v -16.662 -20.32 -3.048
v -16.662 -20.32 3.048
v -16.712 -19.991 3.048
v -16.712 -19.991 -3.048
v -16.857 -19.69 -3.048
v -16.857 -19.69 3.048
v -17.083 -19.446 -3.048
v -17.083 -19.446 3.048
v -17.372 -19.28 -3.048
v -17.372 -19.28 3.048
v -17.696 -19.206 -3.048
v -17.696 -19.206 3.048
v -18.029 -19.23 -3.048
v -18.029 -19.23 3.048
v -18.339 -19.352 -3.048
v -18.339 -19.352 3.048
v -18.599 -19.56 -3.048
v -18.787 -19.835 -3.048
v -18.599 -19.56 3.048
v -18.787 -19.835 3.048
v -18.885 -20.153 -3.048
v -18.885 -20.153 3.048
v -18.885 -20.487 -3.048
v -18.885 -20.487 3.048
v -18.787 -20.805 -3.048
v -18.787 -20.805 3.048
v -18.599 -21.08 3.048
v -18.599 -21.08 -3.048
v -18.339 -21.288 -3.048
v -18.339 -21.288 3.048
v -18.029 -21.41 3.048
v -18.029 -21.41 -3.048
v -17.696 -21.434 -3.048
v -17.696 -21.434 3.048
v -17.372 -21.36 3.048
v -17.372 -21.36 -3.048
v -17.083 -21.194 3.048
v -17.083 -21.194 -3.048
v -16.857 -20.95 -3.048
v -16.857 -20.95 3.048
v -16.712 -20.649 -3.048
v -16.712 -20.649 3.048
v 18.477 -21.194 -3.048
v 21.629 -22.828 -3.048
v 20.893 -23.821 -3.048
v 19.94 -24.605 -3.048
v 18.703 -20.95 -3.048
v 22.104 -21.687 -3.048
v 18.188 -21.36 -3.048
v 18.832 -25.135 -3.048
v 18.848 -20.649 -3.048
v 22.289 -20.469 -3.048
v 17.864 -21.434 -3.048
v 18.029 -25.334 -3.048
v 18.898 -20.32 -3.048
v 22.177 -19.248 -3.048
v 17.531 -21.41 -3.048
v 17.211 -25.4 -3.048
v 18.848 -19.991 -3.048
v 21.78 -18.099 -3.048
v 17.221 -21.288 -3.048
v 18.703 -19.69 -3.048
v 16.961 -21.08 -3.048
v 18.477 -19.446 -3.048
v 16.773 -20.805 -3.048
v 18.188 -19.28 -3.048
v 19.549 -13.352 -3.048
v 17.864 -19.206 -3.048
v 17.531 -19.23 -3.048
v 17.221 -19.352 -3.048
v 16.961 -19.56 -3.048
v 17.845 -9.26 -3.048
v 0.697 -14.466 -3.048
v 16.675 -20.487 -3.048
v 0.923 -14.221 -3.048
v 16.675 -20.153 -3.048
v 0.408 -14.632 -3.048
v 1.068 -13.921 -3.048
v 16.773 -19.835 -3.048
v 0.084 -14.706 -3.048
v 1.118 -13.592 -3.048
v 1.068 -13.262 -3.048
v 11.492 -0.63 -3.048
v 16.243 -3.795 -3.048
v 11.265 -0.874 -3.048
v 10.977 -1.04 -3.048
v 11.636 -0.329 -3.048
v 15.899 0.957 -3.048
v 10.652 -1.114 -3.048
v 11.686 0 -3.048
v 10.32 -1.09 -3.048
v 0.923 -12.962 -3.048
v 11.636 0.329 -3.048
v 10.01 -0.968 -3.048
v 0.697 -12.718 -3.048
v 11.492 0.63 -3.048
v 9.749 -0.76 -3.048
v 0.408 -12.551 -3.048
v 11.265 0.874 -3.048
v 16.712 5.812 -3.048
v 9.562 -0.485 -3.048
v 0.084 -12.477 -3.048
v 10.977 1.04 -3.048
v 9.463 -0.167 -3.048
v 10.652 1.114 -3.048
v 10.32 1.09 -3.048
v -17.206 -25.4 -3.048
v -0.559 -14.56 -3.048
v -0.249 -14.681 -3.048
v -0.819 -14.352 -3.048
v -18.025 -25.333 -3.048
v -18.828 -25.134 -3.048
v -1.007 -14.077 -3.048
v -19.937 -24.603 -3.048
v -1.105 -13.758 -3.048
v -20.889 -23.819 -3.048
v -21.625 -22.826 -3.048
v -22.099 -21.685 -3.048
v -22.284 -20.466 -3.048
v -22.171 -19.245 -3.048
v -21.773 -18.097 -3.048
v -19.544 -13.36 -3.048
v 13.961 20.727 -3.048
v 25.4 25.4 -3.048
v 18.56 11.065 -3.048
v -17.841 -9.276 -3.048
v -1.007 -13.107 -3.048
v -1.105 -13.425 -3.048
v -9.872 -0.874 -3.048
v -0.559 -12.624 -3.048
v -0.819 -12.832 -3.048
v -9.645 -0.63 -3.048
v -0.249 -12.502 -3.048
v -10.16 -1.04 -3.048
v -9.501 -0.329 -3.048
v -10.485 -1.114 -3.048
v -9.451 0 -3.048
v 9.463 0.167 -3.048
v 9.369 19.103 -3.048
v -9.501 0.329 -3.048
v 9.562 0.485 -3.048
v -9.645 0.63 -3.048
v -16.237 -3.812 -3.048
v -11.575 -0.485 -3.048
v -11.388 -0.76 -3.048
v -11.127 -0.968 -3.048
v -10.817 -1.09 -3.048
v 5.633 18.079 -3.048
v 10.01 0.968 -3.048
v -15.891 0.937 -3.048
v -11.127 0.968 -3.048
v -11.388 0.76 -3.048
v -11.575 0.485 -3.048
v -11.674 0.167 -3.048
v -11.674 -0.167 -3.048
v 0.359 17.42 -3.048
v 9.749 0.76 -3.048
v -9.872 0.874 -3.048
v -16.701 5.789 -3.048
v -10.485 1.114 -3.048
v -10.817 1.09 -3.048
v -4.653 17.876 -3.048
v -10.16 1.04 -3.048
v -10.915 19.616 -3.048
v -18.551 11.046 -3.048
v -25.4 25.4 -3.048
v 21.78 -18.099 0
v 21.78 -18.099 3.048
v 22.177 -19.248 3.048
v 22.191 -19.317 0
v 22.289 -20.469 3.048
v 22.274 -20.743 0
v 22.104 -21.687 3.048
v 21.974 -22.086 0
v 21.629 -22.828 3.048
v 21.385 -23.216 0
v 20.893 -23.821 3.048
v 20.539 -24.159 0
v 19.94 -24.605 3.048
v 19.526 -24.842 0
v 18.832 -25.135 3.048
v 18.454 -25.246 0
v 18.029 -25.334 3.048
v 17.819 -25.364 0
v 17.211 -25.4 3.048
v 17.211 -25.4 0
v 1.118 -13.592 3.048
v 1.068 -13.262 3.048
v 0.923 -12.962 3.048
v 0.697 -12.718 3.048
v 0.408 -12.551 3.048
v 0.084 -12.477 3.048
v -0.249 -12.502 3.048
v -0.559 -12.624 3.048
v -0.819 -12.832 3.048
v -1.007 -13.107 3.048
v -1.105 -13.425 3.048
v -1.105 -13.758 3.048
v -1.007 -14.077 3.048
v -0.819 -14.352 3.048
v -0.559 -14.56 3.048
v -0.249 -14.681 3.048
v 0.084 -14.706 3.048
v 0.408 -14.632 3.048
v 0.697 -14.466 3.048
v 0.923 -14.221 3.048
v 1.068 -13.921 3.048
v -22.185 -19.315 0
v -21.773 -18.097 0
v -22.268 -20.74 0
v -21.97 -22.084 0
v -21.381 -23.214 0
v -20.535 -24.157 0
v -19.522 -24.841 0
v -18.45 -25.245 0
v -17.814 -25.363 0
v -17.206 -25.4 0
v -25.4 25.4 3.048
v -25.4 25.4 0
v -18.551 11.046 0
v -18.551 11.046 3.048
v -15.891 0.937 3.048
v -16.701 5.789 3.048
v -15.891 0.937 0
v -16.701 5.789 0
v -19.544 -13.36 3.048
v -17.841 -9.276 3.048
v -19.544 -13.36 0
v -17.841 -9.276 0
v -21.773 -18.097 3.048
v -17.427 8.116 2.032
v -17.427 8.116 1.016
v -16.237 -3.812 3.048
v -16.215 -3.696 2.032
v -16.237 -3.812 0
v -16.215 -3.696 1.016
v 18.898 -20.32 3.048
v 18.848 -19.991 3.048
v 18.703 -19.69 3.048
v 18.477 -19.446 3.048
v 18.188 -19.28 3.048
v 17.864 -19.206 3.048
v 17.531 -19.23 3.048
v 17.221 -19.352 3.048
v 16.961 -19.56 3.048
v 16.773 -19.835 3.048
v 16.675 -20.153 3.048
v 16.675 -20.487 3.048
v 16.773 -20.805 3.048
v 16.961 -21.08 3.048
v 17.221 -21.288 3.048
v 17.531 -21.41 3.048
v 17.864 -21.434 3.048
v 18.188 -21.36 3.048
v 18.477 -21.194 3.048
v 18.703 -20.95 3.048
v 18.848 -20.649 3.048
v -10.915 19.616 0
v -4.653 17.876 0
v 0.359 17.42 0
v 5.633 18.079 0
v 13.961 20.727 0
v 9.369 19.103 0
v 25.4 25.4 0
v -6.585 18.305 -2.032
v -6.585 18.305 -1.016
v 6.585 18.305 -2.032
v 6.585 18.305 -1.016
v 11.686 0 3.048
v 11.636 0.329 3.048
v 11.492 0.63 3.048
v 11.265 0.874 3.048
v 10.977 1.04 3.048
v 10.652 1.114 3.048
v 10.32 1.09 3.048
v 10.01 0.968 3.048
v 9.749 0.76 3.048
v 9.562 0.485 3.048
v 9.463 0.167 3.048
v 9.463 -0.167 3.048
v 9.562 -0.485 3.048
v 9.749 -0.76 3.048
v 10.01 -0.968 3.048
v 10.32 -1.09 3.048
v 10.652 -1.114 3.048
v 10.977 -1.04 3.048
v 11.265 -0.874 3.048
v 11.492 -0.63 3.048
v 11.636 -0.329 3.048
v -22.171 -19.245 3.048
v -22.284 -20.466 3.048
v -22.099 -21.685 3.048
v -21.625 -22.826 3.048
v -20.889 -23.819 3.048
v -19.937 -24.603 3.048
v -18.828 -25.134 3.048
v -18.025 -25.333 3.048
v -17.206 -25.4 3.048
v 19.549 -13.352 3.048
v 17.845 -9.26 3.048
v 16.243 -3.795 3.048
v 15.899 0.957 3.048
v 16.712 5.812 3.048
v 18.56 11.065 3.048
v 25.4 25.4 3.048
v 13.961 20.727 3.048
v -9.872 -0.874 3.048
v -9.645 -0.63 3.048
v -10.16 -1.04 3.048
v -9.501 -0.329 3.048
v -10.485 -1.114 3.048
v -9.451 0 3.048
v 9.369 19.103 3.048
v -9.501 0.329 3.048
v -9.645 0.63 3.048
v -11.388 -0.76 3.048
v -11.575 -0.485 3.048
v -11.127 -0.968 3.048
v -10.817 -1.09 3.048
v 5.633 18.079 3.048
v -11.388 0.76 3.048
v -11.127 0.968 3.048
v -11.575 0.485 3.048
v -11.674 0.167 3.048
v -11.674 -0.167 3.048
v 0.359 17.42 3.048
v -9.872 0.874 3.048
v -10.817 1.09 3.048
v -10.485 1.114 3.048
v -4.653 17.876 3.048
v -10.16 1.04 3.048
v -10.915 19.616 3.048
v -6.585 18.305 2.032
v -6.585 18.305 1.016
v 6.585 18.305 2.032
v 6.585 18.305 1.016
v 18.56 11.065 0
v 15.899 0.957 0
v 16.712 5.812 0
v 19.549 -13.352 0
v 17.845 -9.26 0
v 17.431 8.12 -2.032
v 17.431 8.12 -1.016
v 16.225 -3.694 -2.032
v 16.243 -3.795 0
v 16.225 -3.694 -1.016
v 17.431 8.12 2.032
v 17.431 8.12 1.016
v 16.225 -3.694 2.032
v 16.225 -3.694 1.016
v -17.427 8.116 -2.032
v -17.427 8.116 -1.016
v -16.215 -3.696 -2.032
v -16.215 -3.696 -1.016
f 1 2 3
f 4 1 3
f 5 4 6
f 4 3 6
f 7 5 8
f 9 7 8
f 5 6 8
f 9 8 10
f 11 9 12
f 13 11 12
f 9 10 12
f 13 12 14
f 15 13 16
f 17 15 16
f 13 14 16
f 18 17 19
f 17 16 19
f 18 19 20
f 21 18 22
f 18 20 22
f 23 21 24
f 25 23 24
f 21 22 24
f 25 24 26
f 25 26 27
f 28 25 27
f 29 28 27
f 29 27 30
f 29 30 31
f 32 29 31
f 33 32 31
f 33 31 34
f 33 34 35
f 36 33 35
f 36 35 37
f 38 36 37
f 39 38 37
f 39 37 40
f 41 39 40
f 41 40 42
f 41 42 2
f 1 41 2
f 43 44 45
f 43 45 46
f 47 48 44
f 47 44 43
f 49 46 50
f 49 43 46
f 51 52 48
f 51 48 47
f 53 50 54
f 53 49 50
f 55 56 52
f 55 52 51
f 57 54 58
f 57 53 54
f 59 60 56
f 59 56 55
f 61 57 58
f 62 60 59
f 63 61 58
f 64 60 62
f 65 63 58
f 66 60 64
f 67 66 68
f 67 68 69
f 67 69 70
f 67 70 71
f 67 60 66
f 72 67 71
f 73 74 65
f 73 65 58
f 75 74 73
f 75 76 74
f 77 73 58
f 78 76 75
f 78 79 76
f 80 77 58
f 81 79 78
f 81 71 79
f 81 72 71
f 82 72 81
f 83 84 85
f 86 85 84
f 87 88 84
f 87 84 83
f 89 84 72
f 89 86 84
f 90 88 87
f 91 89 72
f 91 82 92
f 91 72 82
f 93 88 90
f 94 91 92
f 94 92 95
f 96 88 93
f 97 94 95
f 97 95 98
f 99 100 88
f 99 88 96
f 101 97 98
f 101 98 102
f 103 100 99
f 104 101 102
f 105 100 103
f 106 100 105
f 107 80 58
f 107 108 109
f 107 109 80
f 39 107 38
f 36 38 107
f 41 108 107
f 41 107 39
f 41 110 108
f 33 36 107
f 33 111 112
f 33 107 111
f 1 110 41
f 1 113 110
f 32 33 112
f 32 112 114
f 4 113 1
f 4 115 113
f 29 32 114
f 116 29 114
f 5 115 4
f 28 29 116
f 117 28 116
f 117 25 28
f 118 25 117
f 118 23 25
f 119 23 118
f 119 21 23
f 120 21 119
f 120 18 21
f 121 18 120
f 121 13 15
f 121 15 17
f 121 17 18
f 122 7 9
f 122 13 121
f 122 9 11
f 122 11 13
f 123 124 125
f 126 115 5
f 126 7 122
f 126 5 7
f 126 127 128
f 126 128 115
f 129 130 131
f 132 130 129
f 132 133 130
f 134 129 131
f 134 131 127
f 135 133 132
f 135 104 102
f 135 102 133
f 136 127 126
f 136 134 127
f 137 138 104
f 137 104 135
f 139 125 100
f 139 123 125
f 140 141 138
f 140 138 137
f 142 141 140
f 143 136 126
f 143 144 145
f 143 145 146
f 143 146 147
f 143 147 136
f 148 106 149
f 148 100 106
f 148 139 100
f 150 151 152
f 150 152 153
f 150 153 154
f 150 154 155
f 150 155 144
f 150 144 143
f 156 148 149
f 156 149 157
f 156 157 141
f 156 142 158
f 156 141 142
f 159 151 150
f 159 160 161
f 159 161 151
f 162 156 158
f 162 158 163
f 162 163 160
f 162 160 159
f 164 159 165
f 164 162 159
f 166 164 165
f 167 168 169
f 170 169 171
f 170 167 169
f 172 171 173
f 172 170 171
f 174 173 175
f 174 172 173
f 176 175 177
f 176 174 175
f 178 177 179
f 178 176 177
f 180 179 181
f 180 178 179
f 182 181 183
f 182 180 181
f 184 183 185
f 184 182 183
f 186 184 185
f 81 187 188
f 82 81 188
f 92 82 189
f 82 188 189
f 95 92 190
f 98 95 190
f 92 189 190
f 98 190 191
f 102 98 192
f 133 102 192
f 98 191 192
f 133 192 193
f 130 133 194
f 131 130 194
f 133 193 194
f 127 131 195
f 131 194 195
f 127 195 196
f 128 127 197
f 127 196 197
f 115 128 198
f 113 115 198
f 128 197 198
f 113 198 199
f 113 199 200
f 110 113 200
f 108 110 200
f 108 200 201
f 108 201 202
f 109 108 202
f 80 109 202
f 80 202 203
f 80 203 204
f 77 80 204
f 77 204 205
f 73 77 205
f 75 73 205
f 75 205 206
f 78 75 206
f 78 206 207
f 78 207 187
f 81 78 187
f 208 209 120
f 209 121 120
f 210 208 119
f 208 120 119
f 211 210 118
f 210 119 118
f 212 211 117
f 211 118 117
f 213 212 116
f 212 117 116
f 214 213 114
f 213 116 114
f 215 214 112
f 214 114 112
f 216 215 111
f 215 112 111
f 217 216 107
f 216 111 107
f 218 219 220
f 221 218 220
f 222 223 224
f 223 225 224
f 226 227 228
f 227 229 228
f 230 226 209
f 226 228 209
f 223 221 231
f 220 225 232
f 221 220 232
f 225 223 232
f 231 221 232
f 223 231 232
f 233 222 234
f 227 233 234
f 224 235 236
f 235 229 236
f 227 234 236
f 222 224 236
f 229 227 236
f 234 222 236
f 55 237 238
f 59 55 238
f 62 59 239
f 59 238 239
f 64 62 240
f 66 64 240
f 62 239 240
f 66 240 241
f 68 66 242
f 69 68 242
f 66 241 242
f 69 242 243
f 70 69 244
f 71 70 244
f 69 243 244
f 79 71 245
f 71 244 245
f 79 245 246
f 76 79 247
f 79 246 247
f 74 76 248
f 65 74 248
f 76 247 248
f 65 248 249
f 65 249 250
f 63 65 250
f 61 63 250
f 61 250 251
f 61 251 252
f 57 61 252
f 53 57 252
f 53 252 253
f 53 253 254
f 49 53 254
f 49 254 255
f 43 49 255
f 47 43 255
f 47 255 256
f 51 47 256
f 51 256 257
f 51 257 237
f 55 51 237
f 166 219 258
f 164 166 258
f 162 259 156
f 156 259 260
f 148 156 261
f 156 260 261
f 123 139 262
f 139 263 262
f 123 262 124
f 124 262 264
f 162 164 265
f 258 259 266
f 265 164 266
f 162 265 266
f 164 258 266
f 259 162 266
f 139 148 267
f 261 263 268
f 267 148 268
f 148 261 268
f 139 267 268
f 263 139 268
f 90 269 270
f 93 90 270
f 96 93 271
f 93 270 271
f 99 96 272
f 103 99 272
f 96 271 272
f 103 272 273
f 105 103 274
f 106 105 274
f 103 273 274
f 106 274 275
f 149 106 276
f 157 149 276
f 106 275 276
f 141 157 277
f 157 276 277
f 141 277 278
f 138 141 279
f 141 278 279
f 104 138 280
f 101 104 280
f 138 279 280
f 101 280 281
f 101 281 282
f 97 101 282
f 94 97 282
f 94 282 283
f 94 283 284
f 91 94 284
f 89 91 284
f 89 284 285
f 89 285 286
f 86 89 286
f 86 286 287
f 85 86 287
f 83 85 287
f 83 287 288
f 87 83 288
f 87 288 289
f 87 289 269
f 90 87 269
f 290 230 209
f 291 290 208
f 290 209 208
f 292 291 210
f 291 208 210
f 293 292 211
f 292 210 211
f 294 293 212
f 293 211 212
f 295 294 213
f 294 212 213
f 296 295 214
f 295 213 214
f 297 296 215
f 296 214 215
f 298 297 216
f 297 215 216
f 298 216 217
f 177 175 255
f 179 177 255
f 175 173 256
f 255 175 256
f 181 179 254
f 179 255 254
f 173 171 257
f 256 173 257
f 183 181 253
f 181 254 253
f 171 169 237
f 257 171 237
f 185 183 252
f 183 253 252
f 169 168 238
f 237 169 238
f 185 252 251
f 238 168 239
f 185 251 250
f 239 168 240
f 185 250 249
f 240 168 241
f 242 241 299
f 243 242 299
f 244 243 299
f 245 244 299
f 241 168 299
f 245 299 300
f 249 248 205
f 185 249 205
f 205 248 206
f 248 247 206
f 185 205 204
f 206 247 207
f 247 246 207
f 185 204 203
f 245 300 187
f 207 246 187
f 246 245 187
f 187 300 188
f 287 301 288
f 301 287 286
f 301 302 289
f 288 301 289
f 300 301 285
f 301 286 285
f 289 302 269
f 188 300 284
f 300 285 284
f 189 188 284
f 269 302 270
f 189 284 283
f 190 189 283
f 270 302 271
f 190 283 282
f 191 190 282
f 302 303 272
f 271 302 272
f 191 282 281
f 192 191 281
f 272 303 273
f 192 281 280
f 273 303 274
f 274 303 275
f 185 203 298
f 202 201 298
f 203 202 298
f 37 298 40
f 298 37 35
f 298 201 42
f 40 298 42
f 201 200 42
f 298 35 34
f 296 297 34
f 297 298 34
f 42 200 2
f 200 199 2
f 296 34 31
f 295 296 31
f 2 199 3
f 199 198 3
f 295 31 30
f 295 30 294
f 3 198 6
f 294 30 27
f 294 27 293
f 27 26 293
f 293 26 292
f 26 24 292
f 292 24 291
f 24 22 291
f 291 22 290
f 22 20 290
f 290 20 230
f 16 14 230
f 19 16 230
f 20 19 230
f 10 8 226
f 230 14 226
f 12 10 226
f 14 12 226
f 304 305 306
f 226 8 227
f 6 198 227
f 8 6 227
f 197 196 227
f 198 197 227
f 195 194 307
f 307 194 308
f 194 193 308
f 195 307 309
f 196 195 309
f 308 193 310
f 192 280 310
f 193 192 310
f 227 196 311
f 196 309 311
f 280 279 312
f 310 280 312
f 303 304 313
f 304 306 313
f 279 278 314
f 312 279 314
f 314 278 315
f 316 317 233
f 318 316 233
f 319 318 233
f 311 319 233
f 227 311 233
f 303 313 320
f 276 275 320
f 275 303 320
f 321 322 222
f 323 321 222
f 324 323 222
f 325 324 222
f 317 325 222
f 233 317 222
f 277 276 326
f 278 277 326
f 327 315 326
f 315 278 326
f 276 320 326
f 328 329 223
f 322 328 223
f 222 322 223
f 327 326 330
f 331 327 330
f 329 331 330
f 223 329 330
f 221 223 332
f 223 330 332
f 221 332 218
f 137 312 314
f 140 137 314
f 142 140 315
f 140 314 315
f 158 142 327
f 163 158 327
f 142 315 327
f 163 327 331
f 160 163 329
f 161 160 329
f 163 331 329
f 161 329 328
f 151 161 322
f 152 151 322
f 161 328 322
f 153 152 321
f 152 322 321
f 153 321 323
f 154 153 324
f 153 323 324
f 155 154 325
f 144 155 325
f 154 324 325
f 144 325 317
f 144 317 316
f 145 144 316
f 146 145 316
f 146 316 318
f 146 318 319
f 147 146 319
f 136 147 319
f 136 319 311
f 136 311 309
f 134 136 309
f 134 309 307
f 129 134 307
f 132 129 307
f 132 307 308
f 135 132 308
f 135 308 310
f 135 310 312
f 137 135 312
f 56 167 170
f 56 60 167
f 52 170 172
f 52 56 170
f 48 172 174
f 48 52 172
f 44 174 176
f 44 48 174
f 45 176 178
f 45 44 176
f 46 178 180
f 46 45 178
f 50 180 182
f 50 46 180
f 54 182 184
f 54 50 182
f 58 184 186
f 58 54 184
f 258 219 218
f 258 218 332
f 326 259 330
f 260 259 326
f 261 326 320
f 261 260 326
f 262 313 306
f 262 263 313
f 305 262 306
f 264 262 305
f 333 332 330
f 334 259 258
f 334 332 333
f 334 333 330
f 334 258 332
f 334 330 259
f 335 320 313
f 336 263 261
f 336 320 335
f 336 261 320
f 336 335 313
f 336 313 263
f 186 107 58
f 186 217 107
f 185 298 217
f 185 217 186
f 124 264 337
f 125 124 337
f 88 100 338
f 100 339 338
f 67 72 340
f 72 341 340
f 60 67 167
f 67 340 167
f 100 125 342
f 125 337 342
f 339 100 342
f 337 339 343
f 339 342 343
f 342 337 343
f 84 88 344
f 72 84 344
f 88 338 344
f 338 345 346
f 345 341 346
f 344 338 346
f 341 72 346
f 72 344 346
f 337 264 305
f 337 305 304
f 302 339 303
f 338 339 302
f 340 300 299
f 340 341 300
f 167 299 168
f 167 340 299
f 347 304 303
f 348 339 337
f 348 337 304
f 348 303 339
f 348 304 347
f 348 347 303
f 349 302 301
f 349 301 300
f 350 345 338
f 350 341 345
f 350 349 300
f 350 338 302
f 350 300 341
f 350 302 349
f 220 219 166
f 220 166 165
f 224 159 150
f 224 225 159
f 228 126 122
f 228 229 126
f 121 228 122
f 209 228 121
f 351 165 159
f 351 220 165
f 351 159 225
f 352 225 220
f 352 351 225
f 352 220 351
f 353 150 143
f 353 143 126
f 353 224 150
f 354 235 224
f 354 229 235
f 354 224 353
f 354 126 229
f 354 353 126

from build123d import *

# Parameters (mm, degrees)
F1_DEPTH = 3.048
F2_R     = 1.1176
F3_DEPTH = 6.35
F4_R     = 5.08


with BuildPart() as f1:
    # F0 (on Top) → F1 (new body, symmetric)
    with BuildSketch(Plane.XY):
        with BuildLine():
            add(Edge.make_bspline(
                [(-25.4, 25.4), (0, 14.75683), (0, 14.75683), (25.4, 25.4)],
                knots=[0, 0, 0, 0, 50.8, 50.8, 50.8, 50.8], degree=3))
            add(Edge.make_bspline(
                [(-25.4, 25.4), (-12.7, -0.009303), (-12.678587, 0), (-25.4, -25.4)],
                knots=[0, 0, 0, 0, 50.8, 50.8, 50.8, 50.8], degree=3))
            Line((-25.4, -25.4), (25.4, -25.4))
            add(Edge.make_bspline(
                [(25.4, 25.4), (12.7, 0), (12.7, 0), (25.4, -25.4)],
                knots=[0, 0, 0, 0, 50.8, 50.8, 50.8, 50.8], degree=3))
        make_face()
    extrude(amount=F1_DEPTH, both=True)

    # F2 (on face) → F3 (cut)
    with BuildSketch(Plane.XY.offset(3.048)):
        with Locations((-17.78, -20.32)):
            Circle(F2_R)
        with Locations((17.78, -20.32)):
            Circle(F2_R)
        with Locations((0, -13.591802)):
            Circle(F2_R)
        with Locations((-10.568528, 0)):
            Circle(F2_R)
        with Locations((10.568528, 0)):
            Circle(F2_R)
    extrude(amount=-F3_DEPTH, mode=Mode.SUBTRACT)

    # F4
    f4_edges = [f1.edges().sort_by_distance(p)[0] for p in [
        (-25.4, -25.4, -1.524),
        (25.4, -25.4, -1.524),
    ]]
    fillet(f4_edges, radius=F4_R)


solid = f1.part
